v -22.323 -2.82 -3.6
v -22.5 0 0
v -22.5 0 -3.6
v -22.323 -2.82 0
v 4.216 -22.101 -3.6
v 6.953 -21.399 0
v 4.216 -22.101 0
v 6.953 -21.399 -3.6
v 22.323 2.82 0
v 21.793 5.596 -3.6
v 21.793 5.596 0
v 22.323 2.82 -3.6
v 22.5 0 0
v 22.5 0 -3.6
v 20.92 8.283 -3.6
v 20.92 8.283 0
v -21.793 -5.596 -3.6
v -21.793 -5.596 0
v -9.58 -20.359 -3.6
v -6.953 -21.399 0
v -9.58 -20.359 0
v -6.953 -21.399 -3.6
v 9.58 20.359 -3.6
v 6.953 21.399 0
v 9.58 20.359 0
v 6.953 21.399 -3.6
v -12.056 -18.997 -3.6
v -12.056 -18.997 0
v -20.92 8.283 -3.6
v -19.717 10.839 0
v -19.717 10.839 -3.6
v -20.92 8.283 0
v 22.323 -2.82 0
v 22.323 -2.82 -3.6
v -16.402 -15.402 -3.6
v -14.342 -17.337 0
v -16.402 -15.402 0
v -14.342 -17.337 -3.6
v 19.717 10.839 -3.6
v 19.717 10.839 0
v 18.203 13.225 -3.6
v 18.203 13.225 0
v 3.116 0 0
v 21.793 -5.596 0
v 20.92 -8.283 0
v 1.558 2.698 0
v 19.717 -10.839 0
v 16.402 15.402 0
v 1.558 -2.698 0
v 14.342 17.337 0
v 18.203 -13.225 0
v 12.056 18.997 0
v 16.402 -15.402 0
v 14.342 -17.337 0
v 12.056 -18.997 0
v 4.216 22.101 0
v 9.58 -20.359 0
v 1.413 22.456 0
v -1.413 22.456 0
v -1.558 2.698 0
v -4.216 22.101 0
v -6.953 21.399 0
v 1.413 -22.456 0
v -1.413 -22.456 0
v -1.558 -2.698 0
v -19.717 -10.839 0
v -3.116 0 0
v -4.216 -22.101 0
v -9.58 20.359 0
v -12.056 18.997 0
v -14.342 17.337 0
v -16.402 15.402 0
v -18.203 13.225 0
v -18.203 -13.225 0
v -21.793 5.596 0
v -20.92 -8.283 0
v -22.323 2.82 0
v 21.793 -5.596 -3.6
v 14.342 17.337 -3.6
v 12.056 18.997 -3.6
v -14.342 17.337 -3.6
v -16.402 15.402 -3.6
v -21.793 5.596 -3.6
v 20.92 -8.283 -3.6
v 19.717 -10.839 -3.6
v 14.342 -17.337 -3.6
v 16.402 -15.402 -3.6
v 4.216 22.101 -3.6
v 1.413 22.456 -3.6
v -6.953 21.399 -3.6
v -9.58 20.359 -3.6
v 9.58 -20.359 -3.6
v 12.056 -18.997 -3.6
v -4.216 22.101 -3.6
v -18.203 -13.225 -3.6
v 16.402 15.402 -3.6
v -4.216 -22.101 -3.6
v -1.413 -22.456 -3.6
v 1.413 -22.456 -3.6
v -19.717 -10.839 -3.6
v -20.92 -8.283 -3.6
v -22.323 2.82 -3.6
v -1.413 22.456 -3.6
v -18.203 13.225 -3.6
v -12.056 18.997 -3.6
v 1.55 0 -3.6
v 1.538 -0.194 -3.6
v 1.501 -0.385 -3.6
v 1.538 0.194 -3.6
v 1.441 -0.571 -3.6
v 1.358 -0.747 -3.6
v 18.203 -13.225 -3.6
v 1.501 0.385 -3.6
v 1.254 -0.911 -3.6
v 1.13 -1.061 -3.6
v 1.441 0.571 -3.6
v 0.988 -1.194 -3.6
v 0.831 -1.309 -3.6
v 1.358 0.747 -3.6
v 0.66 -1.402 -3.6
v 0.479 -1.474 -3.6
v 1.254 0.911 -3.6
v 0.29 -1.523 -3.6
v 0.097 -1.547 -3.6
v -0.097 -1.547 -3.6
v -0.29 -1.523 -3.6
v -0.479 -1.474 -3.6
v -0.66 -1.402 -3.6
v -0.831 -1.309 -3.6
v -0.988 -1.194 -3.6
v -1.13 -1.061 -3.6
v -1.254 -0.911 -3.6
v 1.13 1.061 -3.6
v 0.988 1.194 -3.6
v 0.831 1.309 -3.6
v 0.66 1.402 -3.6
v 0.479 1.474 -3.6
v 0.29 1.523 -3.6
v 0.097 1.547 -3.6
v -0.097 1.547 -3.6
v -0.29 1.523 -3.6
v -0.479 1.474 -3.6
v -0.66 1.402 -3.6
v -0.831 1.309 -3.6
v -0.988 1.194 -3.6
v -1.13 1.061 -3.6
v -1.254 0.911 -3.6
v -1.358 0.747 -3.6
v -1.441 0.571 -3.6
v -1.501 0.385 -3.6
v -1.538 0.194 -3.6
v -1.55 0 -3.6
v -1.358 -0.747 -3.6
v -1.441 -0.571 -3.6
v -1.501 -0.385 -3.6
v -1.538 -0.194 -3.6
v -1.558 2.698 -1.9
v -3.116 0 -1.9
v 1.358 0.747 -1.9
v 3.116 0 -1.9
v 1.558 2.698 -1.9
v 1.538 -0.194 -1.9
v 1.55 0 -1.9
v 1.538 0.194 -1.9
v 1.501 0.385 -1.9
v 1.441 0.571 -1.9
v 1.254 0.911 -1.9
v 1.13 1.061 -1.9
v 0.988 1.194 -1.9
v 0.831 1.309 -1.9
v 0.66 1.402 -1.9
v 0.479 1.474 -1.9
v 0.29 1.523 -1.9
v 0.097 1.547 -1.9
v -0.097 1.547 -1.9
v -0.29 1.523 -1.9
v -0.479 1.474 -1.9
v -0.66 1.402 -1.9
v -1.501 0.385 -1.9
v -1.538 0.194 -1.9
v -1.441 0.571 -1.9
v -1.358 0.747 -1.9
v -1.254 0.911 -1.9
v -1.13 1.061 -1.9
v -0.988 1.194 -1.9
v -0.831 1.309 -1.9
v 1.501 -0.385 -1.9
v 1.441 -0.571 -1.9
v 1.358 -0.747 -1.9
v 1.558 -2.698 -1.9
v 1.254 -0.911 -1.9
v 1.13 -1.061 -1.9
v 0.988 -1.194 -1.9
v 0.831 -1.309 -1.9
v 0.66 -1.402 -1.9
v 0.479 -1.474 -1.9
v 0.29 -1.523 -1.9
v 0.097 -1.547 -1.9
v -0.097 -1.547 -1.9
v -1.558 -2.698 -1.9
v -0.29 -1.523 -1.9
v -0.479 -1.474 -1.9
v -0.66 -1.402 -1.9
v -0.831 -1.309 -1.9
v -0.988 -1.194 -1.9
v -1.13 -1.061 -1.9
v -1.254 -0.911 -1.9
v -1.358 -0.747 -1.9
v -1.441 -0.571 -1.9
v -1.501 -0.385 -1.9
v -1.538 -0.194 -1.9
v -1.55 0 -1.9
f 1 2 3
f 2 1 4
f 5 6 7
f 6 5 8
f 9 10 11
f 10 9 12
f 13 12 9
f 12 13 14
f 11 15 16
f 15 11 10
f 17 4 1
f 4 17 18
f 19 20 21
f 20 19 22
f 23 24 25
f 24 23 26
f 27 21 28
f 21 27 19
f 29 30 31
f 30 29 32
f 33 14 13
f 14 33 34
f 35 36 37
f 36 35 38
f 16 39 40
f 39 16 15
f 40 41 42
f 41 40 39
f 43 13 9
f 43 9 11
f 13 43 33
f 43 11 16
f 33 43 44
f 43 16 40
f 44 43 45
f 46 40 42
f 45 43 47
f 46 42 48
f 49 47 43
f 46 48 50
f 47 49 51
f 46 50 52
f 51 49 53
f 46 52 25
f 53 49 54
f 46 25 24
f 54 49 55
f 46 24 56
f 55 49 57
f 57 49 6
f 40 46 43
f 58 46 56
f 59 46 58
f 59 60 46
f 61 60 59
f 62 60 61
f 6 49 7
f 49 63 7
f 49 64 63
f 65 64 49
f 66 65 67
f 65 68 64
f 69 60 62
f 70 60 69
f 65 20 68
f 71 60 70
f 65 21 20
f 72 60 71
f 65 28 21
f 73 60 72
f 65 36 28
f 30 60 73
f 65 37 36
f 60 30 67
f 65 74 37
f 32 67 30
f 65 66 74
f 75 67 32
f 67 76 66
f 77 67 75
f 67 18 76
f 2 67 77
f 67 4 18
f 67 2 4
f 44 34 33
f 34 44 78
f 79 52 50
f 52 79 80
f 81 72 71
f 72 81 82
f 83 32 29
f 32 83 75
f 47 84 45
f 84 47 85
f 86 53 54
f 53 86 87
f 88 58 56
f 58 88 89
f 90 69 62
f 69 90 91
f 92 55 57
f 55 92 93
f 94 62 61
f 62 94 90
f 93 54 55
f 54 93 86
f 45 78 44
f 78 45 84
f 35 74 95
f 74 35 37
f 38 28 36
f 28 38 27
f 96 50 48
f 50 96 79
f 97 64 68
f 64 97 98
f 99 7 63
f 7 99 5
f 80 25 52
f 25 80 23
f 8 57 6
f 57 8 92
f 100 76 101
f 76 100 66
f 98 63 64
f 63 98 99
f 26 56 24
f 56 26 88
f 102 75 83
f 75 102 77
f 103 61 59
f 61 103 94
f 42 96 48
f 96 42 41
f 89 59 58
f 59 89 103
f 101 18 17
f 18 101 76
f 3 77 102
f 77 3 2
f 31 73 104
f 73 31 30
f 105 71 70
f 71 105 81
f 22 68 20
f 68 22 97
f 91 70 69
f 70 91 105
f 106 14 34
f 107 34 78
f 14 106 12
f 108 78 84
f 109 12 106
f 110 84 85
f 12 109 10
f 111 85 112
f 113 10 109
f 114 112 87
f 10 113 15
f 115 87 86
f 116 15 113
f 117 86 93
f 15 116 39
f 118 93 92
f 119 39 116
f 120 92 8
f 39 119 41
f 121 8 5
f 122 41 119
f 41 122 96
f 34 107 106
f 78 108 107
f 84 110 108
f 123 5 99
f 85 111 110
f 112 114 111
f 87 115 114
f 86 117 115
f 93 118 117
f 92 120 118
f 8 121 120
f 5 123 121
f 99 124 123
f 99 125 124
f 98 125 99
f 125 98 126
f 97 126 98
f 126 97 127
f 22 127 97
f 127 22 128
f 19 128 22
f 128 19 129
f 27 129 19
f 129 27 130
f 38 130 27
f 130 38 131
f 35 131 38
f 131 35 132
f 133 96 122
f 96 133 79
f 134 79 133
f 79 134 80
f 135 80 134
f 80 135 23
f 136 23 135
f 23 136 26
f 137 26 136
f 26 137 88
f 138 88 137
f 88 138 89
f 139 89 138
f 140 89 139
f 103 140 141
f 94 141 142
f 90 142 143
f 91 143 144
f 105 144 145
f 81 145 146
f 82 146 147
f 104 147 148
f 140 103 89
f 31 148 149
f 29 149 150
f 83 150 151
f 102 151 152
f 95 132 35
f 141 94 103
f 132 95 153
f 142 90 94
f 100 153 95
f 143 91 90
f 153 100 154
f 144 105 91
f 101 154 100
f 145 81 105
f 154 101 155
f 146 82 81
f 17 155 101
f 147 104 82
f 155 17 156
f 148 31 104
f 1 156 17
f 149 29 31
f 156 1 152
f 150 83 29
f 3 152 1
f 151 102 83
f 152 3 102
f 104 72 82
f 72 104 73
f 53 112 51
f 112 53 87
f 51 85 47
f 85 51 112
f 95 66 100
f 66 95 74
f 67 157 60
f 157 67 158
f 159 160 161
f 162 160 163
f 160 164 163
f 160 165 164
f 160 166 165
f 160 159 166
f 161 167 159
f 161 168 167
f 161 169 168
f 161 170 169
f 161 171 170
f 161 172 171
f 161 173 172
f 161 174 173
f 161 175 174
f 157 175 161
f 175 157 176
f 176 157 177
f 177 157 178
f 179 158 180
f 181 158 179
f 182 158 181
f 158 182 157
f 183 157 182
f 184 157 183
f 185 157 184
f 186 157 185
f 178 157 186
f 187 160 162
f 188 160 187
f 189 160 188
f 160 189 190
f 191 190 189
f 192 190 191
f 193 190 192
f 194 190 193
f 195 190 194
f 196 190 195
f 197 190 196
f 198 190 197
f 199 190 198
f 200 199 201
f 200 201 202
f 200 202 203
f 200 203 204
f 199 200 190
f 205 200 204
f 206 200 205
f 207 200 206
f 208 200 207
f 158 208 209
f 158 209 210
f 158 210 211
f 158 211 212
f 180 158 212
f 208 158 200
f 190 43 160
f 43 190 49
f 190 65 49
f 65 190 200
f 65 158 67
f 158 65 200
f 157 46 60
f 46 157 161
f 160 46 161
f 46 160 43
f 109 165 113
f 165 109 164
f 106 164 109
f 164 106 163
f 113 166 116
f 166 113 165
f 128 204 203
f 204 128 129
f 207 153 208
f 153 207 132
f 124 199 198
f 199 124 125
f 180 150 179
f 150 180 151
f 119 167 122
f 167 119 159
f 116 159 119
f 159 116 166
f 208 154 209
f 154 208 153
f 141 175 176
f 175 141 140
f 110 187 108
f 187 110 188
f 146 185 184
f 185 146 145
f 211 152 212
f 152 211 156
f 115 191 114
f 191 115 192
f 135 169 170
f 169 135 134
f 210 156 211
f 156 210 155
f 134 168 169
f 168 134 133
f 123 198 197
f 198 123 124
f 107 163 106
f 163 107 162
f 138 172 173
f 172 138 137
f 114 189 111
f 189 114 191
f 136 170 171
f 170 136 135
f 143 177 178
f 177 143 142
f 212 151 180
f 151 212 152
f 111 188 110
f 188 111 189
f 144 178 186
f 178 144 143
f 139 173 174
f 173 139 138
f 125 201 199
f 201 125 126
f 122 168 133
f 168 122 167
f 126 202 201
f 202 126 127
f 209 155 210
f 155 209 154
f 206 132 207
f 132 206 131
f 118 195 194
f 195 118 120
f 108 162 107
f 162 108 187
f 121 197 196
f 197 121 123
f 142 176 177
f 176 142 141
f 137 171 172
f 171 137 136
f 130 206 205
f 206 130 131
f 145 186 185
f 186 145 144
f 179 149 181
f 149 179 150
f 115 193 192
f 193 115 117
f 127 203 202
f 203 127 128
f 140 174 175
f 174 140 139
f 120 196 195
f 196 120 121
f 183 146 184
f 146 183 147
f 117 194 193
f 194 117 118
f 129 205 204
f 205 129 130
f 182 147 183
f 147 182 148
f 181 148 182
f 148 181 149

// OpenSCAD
$fn = 50;


difference() {
	union() {
		translate(v = [0, 0, -3.6000000000]) {
			cylinder(h = 3.6000000000, r = 22.5000000000);
		}
		translate(v = [0, 0, -2.1000000000]) {
			cylinder(h = 2.1000000000, r = 2.8750000000);
		}
	}
	union() {
		translate(v = [0, 0, 0]) {
			rotate(a = [0, 0, 0]) {
				difference() {
					union() {
						translate(v = [0, 0, -1.9000000000]) {
							linear_extrude(height = 1.9000000000) {
								polygon(points = [[3.1158000000, 0.0000000000], [1.5579000000, 2.6983619531], [-1.5579000000, 2.6983619531], [-3.1158000000, 0.0000000000], [-1.5579000000, -2.6983619531], [1.5579000000, -2.6983619531]]);
							}
						}
					}
					union();
				}
			}
		}
		#translate(v = [0, 0, -100.0000000000]) {
			cylinder(h = 200, r = 1.5500000000);
		}
	}
}
